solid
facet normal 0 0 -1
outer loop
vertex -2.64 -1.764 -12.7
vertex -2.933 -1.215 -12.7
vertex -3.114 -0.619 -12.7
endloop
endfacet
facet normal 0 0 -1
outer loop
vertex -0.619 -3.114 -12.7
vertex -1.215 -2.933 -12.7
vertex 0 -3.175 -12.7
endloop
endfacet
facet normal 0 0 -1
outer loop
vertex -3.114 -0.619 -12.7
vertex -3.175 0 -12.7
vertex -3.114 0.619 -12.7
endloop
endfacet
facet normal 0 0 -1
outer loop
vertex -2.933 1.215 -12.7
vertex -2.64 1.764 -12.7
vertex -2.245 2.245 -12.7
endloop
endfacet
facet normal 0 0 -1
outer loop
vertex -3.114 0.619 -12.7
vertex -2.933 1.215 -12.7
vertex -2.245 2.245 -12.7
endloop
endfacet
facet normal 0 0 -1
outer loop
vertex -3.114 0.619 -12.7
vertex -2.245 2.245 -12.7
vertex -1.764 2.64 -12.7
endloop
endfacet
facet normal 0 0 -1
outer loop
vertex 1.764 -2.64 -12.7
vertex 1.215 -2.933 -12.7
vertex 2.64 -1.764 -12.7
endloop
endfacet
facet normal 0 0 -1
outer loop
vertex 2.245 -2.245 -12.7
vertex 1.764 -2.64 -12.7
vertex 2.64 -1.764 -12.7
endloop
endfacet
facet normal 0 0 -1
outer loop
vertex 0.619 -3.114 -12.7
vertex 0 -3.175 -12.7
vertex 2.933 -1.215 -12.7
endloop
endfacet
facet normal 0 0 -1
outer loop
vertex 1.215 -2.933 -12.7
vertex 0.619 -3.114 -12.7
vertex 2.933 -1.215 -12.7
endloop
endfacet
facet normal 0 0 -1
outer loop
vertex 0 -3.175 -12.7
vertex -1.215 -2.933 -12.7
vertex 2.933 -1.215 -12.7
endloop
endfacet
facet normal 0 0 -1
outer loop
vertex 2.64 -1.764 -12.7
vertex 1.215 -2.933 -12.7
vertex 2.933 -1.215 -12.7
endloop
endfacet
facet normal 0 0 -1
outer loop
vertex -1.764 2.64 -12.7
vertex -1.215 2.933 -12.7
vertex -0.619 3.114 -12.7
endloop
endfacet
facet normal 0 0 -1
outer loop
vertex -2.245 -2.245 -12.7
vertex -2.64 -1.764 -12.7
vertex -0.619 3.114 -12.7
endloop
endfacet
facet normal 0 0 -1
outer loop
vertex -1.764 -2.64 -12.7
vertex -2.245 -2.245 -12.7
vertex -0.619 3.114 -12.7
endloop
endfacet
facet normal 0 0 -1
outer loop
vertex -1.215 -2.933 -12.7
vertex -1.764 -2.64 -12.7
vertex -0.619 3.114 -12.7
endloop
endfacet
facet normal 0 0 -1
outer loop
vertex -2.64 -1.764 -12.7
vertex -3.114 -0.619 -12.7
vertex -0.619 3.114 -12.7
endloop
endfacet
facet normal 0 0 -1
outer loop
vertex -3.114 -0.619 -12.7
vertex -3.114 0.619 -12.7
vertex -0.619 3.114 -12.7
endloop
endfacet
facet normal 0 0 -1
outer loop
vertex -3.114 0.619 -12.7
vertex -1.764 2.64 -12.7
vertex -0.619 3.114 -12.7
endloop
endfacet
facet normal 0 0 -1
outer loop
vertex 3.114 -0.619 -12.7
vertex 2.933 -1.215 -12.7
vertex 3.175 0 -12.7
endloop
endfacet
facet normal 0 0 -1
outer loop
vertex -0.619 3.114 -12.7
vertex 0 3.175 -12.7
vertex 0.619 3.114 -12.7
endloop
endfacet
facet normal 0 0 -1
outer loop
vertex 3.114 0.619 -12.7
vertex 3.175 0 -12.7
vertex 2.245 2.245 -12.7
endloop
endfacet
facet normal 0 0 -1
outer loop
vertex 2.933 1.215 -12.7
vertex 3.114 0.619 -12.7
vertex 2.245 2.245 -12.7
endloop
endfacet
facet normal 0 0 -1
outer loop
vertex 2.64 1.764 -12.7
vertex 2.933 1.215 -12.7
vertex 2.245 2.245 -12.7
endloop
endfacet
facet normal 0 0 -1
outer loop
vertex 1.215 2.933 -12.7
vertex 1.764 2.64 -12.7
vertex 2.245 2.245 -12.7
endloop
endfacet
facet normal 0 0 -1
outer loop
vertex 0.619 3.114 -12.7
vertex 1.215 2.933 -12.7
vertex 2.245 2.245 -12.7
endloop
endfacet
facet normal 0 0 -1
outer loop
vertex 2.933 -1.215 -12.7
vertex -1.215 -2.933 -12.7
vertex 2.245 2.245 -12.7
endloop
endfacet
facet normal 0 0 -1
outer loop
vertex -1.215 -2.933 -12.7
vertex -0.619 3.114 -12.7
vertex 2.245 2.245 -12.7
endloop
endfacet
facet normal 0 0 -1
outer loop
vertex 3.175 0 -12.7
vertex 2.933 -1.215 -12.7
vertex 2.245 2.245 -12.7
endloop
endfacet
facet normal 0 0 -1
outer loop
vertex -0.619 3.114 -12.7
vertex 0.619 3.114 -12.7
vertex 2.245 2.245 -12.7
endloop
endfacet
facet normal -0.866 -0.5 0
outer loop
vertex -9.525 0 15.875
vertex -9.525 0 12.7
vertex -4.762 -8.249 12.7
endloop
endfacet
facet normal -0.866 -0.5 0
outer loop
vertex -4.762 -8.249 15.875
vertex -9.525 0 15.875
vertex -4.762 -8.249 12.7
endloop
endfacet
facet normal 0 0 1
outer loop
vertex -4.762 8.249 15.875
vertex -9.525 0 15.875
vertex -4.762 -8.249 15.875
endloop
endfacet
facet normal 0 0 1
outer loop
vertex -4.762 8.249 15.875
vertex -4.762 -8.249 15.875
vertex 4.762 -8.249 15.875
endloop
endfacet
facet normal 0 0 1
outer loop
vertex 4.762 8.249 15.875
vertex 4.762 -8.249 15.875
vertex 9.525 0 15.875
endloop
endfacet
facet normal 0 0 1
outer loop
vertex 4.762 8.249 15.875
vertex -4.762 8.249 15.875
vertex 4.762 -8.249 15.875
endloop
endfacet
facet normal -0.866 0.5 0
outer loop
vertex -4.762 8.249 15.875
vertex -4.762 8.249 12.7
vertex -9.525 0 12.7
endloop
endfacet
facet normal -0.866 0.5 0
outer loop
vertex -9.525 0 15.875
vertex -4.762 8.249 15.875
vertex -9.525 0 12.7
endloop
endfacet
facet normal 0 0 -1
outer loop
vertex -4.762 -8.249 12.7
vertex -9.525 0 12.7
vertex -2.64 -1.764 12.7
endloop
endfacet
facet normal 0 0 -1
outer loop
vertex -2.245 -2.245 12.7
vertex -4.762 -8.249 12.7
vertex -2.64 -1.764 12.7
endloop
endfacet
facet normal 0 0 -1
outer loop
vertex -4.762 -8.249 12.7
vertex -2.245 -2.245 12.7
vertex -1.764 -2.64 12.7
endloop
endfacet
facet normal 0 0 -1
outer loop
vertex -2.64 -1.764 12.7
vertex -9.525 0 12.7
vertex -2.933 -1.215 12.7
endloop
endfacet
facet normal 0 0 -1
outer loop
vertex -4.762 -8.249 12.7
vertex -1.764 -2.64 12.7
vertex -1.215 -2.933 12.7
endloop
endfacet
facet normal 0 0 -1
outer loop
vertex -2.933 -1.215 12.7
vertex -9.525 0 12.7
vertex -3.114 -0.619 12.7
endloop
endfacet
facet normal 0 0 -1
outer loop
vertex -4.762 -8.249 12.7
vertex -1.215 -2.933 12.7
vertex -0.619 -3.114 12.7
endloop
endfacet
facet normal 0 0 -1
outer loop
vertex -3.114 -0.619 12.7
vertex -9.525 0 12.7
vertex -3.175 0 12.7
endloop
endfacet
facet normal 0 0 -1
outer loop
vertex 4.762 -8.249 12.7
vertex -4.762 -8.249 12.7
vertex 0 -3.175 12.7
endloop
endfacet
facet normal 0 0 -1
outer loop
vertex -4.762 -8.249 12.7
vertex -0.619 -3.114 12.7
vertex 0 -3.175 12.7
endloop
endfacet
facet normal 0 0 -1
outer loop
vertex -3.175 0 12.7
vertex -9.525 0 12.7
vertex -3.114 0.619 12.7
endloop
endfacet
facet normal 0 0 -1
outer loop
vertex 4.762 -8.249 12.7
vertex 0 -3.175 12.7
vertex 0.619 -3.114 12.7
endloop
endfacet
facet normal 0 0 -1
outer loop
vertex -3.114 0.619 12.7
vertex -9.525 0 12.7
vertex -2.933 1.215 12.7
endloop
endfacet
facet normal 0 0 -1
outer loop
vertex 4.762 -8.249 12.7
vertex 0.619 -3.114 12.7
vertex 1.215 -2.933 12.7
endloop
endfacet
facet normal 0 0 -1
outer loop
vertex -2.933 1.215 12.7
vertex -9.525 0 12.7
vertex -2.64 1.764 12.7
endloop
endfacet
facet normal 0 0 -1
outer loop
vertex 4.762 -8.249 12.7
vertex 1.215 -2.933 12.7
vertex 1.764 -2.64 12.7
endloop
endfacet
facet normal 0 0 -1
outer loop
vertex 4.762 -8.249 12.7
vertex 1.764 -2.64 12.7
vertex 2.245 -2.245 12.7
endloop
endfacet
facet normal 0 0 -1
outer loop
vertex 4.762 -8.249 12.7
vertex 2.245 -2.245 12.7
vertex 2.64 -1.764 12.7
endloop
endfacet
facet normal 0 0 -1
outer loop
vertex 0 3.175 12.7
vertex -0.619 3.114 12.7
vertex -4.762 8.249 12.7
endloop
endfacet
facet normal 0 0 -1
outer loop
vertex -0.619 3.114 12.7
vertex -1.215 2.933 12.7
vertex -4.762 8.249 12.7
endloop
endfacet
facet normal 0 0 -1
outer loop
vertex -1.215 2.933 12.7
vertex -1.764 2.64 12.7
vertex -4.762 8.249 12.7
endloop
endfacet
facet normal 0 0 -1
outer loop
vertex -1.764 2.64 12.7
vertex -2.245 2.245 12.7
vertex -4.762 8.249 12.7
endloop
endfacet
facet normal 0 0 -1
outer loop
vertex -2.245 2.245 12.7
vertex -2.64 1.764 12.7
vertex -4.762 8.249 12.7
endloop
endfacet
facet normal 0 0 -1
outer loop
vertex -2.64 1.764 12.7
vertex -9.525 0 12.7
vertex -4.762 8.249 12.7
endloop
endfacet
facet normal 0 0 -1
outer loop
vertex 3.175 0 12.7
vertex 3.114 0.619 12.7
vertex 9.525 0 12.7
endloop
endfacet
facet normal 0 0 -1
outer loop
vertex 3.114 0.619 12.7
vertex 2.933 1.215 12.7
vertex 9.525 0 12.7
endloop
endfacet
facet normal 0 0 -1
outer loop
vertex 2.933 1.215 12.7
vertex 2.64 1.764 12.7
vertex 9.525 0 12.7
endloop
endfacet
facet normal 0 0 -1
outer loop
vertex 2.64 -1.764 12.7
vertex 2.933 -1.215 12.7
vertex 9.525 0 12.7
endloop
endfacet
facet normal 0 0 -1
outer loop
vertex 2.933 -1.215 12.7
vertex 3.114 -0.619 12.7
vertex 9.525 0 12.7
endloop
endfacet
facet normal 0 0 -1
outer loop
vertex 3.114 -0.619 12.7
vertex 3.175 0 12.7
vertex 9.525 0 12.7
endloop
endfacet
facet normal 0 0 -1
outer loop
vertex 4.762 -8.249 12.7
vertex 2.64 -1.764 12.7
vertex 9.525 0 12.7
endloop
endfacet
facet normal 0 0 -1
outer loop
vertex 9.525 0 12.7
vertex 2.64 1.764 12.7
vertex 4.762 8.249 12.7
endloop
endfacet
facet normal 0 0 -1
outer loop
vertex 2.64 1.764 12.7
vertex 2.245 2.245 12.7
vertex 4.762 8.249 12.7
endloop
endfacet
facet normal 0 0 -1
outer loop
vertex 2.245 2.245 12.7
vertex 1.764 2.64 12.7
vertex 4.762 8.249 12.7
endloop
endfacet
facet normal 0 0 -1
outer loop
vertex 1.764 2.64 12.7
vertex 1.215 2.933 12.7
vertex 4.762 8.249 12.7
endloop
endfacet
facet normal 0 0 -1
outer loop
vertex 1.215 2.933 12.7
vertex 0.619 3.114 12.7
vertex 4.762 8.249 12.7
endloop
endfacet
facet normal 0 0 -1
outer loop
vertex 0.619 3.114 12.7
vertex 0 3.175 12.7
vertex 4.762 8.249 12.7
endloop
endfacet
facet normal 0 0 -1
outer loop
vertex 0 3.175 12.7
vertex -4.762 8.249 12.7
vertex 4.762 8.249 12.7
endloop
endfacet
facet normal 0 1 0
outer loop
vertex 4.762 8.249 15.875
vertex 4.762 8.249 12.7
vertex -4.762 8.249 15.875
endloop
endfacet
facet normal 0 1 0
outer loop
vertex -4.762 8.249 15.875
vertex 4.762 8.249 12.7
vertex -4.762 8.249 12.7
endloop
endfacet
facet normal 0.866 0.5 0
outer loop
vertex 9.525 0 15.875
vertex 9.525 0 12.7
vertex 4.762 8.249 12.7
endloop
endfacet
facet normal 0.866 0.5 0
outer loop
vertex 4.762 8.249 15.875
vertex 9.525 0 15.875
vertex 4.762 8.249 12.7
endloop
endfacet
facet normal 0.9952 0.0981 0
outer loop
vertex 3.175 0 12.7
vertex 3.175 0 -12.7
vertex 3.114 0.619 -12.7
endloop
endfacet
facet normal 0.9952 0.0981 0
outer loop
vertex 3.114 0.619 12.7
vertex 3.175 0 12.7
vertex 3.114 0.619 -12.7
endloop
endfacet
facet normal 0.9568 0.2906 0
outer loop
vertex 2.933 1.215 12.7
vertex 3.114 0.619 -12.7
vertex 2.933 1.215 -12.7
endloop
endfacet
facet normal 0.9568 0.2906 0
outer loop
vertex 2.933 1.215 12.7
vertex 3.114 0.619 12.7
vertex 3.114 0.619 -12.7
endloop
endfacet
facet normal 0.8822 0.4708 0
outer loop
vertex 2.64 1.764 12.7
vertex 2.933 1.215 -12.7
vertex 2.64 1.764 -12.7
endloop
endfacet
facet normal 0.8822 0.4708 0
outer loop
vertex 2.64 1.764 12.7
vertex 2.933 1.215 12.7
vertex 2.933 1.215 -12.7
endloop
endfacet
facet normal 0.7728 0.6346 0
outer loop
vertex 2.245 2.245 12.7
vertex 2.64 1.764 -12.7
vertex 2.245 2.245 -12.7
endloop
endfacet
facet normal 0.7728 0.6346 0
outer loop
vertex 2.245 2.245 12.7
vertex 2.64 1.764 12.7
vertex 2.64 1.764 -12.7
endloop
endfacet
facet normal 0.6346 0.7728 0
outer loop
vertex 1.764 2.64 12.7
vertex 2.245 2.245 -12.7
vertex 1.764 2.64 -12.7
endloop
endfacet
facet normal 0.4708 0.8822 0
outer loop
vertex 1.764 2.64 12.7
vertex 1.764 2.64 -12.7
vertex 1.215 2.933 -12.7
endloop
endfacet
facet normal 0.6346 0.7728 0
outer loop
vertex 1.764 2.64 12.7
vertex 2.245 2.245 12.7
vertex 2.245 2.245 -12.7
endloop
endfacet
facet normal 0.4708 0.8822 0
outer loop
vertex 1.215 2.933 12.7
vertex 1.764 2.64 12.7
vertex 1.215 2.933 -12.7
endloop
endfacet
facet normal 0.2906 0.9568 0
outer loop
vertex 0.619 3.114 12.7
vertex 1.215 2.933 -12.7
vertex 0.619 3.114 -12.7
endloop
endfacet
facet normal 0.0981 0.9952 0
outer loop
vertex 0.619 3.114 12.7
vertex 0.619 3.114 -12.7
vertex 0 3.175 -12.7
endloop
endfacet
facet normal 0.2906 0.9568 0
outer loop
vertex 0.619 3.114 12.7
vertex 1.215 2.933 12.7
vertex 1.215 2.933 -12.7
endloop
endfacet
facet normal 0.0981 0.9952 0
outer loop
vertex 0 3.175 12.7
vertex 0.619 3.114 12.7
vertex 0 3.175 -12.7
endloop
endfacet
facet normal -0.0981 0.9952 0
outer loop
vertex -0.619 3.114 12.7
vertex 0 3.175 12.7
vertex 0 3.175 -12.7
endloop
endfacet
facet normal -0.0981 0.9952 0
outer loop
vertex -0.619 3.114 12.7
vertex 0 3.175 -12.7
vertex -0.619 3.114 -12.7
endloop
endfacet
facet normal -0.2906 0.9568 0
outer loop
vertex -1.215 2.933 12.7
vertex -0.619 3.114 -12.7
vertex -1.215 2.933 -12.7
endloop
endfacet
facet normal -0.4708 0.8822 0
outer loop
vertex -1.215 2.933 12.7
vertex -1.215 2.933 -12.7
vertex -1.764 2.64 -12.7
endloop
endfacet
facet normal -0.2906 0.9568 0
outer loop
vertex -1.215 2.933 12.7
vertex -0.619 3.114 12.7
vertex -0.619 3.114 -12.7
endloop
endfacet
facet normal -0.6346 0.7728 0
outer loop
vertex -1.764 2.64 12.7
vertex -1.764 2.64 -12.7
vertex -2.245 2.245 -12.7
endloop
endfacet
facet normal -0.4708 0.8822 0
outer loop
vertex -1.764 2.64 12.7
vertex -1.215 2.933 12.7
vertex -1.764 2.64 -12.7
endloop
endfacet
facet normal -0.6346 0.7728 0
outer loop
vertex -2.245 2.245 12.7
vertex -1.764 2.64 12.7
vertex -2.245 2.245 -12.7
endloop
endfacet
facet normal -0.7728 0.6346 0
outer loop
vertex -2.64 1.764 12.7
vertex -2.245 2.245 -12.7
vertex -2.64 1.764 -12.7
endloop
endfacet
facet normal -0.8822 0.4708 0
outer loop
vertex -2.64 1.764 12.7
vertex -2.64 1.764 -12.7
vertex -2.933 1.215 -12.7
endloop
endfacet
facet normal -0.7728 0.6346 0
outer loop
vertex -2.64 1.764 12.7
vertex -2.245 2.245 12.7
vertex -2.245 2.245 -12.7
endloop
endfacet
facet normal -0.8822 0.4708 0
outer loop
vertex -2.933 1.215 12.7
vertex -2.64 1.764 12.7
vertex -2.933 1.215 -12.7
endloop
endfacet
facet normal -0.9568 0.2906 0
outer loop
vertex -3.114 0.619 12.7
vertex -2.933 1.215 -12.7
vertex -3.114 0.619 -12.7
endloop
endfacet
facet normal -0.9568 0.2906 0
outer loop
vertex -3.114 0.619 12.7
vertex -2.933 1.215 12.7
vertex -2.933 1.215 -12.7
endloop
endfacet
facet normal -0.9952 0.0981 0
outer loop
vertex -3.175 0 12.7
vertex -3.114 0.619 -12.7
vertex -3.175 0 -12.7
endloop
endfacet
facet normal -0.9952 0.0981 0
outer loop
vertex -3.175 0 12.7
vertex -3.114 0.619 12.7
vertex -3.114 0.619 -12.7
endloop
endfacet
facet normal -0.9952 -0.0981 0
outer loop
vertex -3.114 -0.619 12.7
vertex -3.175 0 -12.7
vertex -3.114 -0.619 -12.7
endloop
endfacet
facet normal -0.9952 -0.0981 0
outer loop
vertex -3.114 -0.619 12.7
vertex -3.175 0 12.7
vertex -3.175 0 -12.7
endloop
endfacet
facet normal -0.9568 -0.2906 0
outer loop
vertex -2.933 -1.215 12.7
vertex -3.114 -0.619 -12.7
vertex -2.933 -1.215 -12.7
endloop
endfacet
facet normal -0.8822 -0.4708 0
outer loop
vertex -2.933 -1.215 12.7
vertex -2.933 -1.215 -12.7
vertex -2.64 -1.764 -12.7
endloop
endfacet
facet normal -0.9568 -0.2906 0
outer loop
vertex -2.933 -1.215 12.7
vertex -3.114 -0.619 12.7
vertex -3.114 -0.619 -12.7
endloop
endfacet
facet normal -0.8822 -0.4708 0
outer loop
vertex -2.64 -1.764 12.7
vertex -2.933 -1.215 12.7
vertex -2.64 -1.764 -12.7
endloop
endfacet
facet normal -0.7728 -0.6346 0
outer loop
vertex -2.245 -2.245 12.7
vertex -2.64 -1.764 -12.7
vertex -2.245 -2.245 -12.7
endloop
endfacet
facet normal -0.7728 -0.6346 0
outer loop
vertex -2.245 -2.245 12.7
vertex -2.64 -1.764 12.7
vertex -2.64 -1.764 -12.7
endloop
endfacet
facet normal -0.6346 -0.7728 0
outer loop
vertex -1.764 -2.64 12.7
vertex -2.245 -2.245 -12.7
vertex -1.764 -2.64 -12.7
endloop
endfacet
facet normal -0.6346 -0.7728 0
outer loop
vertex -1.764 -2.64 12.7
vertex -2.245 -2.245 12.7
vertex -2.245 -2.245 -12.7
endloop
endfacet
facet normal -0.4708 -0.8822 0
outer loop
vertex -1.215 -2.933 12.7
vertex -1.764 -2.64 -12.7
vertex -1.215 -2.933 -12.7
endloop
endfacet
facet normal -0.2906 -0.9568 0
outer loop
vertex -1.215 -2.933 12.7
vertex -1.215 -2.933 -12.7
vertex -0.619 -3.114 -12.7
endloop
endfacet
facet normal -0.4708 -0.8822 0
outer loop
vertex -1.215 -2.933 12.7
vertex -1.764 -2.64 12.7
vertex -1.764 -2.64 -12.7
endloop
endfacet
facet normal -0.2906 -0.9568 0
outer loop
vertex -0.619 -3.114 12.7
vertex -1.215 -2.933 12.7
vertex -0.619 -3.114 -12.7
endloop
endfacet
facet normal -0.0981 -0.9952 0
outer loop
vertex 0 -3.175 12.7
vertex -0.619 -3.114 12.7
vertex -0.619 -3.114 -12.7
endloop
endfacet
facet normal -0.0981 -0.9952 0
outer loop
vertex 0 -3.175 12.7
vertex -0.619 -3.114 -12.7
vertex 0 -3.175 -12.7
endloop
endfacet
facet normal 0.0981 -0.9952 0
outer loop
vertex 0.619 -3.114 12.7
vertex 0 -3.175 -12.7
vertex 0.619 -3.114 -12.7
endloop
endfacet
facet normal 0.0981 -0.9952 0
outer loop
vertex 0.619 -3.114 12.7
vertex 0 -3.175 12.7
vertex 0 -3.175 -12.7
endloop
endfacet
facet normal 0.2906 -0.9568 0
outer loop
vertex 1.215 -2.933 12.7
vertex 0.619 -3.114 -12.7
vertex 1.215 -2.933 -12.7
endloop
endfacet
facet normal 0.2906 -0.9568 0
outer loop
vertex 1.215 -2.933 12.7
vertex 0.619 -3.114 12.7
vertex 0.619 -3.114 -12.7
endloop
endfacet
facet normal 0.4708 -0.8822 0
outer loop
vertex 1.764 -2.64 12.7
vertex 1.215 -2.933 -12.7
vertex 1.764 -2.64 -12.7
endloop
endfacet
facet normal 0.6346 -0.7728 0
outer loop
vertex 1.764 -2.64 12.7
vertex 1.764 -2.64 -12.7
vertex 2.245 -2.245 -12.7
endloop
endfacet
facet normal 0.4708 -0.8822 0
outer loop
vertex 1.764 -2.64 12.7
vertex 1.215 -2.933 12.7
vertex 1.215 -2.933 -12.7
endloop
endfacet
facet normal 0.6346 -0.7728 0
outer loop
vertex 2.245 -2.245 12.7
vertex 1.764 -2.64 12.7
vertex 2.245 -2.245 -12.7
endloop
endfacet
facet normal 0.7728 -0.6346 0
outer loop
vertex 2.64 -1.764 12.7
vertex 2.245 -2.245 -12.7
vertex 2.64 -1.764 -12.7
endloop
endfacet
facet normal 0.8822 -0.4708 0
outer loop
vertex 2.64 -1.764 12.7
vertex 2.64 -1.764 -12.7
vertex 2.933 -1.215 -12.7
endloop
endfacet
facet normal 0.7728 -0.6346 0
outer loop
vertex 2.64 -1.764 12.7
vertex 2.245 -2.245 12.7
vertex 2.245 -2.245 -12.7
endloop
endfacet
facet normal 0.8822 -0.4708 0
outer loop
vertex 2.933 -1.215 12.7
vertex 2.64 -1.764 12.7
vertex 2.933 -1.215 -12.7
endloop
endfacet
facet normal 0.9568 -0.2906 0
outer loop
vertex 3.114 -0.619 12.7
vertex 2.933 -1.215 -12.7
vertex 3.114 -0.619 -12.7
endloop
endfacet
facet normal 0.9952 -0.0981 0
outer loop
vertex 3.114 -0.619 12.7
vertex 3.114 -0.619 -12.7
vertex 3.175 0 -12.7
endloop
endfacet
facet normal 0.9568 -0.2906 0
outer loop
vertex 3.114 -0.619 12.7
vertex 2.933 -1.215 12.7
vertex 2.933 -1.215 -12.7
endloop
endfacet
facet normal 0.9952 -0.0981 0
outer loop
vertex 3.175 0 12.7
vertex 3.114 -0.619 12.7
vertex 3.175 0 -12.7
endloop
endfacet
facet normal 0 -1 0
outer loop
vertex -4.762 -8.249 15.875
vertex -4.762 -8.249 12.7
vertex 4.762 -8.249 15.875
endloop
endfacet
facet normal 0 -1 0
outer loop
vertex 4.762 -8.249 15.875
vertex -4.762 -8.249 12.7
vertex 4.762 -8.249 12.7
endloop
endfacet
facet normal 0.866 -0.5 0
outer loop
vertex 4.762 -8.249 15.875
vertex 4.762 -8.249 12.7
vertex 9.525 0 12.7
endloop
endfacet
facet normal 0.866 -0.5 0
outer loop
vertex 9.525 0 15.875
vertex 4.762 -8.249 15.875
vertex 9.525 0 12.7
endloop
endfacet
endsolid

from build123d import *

# Parameters (mm, degrees)
SKETCH1_R           = 3.175
BOSS_EXTRUDE1_DEPTH = 12.7
BOSS_EXTRUDE3_DEPTH = 3.175


with BuildPart() as part:
    # Sketch1 → Boss-Extrude1 (new, symmetric)
    with BuildSketch(Plane.XY):
        Circle(SKETCH1_R)
    extrude(amount=BOSS_EXTRUDE1_DEPTH, both=True)

    # Sketch2 → Boss-Extrude3 (add)
    with BuildSketch(Plane.XY.offset(12.7)):
        Polygon((9.525, 0), (4.7625, 8.248891971), (-4.7625, 8.248891971), (-9.525, 0), (-4.7625, -8.248891971), (4.7625, -8.248891971), align=None)
    extrude(amount=BOSS_EXTRUDE3_DEPTH)


solid = part.part
